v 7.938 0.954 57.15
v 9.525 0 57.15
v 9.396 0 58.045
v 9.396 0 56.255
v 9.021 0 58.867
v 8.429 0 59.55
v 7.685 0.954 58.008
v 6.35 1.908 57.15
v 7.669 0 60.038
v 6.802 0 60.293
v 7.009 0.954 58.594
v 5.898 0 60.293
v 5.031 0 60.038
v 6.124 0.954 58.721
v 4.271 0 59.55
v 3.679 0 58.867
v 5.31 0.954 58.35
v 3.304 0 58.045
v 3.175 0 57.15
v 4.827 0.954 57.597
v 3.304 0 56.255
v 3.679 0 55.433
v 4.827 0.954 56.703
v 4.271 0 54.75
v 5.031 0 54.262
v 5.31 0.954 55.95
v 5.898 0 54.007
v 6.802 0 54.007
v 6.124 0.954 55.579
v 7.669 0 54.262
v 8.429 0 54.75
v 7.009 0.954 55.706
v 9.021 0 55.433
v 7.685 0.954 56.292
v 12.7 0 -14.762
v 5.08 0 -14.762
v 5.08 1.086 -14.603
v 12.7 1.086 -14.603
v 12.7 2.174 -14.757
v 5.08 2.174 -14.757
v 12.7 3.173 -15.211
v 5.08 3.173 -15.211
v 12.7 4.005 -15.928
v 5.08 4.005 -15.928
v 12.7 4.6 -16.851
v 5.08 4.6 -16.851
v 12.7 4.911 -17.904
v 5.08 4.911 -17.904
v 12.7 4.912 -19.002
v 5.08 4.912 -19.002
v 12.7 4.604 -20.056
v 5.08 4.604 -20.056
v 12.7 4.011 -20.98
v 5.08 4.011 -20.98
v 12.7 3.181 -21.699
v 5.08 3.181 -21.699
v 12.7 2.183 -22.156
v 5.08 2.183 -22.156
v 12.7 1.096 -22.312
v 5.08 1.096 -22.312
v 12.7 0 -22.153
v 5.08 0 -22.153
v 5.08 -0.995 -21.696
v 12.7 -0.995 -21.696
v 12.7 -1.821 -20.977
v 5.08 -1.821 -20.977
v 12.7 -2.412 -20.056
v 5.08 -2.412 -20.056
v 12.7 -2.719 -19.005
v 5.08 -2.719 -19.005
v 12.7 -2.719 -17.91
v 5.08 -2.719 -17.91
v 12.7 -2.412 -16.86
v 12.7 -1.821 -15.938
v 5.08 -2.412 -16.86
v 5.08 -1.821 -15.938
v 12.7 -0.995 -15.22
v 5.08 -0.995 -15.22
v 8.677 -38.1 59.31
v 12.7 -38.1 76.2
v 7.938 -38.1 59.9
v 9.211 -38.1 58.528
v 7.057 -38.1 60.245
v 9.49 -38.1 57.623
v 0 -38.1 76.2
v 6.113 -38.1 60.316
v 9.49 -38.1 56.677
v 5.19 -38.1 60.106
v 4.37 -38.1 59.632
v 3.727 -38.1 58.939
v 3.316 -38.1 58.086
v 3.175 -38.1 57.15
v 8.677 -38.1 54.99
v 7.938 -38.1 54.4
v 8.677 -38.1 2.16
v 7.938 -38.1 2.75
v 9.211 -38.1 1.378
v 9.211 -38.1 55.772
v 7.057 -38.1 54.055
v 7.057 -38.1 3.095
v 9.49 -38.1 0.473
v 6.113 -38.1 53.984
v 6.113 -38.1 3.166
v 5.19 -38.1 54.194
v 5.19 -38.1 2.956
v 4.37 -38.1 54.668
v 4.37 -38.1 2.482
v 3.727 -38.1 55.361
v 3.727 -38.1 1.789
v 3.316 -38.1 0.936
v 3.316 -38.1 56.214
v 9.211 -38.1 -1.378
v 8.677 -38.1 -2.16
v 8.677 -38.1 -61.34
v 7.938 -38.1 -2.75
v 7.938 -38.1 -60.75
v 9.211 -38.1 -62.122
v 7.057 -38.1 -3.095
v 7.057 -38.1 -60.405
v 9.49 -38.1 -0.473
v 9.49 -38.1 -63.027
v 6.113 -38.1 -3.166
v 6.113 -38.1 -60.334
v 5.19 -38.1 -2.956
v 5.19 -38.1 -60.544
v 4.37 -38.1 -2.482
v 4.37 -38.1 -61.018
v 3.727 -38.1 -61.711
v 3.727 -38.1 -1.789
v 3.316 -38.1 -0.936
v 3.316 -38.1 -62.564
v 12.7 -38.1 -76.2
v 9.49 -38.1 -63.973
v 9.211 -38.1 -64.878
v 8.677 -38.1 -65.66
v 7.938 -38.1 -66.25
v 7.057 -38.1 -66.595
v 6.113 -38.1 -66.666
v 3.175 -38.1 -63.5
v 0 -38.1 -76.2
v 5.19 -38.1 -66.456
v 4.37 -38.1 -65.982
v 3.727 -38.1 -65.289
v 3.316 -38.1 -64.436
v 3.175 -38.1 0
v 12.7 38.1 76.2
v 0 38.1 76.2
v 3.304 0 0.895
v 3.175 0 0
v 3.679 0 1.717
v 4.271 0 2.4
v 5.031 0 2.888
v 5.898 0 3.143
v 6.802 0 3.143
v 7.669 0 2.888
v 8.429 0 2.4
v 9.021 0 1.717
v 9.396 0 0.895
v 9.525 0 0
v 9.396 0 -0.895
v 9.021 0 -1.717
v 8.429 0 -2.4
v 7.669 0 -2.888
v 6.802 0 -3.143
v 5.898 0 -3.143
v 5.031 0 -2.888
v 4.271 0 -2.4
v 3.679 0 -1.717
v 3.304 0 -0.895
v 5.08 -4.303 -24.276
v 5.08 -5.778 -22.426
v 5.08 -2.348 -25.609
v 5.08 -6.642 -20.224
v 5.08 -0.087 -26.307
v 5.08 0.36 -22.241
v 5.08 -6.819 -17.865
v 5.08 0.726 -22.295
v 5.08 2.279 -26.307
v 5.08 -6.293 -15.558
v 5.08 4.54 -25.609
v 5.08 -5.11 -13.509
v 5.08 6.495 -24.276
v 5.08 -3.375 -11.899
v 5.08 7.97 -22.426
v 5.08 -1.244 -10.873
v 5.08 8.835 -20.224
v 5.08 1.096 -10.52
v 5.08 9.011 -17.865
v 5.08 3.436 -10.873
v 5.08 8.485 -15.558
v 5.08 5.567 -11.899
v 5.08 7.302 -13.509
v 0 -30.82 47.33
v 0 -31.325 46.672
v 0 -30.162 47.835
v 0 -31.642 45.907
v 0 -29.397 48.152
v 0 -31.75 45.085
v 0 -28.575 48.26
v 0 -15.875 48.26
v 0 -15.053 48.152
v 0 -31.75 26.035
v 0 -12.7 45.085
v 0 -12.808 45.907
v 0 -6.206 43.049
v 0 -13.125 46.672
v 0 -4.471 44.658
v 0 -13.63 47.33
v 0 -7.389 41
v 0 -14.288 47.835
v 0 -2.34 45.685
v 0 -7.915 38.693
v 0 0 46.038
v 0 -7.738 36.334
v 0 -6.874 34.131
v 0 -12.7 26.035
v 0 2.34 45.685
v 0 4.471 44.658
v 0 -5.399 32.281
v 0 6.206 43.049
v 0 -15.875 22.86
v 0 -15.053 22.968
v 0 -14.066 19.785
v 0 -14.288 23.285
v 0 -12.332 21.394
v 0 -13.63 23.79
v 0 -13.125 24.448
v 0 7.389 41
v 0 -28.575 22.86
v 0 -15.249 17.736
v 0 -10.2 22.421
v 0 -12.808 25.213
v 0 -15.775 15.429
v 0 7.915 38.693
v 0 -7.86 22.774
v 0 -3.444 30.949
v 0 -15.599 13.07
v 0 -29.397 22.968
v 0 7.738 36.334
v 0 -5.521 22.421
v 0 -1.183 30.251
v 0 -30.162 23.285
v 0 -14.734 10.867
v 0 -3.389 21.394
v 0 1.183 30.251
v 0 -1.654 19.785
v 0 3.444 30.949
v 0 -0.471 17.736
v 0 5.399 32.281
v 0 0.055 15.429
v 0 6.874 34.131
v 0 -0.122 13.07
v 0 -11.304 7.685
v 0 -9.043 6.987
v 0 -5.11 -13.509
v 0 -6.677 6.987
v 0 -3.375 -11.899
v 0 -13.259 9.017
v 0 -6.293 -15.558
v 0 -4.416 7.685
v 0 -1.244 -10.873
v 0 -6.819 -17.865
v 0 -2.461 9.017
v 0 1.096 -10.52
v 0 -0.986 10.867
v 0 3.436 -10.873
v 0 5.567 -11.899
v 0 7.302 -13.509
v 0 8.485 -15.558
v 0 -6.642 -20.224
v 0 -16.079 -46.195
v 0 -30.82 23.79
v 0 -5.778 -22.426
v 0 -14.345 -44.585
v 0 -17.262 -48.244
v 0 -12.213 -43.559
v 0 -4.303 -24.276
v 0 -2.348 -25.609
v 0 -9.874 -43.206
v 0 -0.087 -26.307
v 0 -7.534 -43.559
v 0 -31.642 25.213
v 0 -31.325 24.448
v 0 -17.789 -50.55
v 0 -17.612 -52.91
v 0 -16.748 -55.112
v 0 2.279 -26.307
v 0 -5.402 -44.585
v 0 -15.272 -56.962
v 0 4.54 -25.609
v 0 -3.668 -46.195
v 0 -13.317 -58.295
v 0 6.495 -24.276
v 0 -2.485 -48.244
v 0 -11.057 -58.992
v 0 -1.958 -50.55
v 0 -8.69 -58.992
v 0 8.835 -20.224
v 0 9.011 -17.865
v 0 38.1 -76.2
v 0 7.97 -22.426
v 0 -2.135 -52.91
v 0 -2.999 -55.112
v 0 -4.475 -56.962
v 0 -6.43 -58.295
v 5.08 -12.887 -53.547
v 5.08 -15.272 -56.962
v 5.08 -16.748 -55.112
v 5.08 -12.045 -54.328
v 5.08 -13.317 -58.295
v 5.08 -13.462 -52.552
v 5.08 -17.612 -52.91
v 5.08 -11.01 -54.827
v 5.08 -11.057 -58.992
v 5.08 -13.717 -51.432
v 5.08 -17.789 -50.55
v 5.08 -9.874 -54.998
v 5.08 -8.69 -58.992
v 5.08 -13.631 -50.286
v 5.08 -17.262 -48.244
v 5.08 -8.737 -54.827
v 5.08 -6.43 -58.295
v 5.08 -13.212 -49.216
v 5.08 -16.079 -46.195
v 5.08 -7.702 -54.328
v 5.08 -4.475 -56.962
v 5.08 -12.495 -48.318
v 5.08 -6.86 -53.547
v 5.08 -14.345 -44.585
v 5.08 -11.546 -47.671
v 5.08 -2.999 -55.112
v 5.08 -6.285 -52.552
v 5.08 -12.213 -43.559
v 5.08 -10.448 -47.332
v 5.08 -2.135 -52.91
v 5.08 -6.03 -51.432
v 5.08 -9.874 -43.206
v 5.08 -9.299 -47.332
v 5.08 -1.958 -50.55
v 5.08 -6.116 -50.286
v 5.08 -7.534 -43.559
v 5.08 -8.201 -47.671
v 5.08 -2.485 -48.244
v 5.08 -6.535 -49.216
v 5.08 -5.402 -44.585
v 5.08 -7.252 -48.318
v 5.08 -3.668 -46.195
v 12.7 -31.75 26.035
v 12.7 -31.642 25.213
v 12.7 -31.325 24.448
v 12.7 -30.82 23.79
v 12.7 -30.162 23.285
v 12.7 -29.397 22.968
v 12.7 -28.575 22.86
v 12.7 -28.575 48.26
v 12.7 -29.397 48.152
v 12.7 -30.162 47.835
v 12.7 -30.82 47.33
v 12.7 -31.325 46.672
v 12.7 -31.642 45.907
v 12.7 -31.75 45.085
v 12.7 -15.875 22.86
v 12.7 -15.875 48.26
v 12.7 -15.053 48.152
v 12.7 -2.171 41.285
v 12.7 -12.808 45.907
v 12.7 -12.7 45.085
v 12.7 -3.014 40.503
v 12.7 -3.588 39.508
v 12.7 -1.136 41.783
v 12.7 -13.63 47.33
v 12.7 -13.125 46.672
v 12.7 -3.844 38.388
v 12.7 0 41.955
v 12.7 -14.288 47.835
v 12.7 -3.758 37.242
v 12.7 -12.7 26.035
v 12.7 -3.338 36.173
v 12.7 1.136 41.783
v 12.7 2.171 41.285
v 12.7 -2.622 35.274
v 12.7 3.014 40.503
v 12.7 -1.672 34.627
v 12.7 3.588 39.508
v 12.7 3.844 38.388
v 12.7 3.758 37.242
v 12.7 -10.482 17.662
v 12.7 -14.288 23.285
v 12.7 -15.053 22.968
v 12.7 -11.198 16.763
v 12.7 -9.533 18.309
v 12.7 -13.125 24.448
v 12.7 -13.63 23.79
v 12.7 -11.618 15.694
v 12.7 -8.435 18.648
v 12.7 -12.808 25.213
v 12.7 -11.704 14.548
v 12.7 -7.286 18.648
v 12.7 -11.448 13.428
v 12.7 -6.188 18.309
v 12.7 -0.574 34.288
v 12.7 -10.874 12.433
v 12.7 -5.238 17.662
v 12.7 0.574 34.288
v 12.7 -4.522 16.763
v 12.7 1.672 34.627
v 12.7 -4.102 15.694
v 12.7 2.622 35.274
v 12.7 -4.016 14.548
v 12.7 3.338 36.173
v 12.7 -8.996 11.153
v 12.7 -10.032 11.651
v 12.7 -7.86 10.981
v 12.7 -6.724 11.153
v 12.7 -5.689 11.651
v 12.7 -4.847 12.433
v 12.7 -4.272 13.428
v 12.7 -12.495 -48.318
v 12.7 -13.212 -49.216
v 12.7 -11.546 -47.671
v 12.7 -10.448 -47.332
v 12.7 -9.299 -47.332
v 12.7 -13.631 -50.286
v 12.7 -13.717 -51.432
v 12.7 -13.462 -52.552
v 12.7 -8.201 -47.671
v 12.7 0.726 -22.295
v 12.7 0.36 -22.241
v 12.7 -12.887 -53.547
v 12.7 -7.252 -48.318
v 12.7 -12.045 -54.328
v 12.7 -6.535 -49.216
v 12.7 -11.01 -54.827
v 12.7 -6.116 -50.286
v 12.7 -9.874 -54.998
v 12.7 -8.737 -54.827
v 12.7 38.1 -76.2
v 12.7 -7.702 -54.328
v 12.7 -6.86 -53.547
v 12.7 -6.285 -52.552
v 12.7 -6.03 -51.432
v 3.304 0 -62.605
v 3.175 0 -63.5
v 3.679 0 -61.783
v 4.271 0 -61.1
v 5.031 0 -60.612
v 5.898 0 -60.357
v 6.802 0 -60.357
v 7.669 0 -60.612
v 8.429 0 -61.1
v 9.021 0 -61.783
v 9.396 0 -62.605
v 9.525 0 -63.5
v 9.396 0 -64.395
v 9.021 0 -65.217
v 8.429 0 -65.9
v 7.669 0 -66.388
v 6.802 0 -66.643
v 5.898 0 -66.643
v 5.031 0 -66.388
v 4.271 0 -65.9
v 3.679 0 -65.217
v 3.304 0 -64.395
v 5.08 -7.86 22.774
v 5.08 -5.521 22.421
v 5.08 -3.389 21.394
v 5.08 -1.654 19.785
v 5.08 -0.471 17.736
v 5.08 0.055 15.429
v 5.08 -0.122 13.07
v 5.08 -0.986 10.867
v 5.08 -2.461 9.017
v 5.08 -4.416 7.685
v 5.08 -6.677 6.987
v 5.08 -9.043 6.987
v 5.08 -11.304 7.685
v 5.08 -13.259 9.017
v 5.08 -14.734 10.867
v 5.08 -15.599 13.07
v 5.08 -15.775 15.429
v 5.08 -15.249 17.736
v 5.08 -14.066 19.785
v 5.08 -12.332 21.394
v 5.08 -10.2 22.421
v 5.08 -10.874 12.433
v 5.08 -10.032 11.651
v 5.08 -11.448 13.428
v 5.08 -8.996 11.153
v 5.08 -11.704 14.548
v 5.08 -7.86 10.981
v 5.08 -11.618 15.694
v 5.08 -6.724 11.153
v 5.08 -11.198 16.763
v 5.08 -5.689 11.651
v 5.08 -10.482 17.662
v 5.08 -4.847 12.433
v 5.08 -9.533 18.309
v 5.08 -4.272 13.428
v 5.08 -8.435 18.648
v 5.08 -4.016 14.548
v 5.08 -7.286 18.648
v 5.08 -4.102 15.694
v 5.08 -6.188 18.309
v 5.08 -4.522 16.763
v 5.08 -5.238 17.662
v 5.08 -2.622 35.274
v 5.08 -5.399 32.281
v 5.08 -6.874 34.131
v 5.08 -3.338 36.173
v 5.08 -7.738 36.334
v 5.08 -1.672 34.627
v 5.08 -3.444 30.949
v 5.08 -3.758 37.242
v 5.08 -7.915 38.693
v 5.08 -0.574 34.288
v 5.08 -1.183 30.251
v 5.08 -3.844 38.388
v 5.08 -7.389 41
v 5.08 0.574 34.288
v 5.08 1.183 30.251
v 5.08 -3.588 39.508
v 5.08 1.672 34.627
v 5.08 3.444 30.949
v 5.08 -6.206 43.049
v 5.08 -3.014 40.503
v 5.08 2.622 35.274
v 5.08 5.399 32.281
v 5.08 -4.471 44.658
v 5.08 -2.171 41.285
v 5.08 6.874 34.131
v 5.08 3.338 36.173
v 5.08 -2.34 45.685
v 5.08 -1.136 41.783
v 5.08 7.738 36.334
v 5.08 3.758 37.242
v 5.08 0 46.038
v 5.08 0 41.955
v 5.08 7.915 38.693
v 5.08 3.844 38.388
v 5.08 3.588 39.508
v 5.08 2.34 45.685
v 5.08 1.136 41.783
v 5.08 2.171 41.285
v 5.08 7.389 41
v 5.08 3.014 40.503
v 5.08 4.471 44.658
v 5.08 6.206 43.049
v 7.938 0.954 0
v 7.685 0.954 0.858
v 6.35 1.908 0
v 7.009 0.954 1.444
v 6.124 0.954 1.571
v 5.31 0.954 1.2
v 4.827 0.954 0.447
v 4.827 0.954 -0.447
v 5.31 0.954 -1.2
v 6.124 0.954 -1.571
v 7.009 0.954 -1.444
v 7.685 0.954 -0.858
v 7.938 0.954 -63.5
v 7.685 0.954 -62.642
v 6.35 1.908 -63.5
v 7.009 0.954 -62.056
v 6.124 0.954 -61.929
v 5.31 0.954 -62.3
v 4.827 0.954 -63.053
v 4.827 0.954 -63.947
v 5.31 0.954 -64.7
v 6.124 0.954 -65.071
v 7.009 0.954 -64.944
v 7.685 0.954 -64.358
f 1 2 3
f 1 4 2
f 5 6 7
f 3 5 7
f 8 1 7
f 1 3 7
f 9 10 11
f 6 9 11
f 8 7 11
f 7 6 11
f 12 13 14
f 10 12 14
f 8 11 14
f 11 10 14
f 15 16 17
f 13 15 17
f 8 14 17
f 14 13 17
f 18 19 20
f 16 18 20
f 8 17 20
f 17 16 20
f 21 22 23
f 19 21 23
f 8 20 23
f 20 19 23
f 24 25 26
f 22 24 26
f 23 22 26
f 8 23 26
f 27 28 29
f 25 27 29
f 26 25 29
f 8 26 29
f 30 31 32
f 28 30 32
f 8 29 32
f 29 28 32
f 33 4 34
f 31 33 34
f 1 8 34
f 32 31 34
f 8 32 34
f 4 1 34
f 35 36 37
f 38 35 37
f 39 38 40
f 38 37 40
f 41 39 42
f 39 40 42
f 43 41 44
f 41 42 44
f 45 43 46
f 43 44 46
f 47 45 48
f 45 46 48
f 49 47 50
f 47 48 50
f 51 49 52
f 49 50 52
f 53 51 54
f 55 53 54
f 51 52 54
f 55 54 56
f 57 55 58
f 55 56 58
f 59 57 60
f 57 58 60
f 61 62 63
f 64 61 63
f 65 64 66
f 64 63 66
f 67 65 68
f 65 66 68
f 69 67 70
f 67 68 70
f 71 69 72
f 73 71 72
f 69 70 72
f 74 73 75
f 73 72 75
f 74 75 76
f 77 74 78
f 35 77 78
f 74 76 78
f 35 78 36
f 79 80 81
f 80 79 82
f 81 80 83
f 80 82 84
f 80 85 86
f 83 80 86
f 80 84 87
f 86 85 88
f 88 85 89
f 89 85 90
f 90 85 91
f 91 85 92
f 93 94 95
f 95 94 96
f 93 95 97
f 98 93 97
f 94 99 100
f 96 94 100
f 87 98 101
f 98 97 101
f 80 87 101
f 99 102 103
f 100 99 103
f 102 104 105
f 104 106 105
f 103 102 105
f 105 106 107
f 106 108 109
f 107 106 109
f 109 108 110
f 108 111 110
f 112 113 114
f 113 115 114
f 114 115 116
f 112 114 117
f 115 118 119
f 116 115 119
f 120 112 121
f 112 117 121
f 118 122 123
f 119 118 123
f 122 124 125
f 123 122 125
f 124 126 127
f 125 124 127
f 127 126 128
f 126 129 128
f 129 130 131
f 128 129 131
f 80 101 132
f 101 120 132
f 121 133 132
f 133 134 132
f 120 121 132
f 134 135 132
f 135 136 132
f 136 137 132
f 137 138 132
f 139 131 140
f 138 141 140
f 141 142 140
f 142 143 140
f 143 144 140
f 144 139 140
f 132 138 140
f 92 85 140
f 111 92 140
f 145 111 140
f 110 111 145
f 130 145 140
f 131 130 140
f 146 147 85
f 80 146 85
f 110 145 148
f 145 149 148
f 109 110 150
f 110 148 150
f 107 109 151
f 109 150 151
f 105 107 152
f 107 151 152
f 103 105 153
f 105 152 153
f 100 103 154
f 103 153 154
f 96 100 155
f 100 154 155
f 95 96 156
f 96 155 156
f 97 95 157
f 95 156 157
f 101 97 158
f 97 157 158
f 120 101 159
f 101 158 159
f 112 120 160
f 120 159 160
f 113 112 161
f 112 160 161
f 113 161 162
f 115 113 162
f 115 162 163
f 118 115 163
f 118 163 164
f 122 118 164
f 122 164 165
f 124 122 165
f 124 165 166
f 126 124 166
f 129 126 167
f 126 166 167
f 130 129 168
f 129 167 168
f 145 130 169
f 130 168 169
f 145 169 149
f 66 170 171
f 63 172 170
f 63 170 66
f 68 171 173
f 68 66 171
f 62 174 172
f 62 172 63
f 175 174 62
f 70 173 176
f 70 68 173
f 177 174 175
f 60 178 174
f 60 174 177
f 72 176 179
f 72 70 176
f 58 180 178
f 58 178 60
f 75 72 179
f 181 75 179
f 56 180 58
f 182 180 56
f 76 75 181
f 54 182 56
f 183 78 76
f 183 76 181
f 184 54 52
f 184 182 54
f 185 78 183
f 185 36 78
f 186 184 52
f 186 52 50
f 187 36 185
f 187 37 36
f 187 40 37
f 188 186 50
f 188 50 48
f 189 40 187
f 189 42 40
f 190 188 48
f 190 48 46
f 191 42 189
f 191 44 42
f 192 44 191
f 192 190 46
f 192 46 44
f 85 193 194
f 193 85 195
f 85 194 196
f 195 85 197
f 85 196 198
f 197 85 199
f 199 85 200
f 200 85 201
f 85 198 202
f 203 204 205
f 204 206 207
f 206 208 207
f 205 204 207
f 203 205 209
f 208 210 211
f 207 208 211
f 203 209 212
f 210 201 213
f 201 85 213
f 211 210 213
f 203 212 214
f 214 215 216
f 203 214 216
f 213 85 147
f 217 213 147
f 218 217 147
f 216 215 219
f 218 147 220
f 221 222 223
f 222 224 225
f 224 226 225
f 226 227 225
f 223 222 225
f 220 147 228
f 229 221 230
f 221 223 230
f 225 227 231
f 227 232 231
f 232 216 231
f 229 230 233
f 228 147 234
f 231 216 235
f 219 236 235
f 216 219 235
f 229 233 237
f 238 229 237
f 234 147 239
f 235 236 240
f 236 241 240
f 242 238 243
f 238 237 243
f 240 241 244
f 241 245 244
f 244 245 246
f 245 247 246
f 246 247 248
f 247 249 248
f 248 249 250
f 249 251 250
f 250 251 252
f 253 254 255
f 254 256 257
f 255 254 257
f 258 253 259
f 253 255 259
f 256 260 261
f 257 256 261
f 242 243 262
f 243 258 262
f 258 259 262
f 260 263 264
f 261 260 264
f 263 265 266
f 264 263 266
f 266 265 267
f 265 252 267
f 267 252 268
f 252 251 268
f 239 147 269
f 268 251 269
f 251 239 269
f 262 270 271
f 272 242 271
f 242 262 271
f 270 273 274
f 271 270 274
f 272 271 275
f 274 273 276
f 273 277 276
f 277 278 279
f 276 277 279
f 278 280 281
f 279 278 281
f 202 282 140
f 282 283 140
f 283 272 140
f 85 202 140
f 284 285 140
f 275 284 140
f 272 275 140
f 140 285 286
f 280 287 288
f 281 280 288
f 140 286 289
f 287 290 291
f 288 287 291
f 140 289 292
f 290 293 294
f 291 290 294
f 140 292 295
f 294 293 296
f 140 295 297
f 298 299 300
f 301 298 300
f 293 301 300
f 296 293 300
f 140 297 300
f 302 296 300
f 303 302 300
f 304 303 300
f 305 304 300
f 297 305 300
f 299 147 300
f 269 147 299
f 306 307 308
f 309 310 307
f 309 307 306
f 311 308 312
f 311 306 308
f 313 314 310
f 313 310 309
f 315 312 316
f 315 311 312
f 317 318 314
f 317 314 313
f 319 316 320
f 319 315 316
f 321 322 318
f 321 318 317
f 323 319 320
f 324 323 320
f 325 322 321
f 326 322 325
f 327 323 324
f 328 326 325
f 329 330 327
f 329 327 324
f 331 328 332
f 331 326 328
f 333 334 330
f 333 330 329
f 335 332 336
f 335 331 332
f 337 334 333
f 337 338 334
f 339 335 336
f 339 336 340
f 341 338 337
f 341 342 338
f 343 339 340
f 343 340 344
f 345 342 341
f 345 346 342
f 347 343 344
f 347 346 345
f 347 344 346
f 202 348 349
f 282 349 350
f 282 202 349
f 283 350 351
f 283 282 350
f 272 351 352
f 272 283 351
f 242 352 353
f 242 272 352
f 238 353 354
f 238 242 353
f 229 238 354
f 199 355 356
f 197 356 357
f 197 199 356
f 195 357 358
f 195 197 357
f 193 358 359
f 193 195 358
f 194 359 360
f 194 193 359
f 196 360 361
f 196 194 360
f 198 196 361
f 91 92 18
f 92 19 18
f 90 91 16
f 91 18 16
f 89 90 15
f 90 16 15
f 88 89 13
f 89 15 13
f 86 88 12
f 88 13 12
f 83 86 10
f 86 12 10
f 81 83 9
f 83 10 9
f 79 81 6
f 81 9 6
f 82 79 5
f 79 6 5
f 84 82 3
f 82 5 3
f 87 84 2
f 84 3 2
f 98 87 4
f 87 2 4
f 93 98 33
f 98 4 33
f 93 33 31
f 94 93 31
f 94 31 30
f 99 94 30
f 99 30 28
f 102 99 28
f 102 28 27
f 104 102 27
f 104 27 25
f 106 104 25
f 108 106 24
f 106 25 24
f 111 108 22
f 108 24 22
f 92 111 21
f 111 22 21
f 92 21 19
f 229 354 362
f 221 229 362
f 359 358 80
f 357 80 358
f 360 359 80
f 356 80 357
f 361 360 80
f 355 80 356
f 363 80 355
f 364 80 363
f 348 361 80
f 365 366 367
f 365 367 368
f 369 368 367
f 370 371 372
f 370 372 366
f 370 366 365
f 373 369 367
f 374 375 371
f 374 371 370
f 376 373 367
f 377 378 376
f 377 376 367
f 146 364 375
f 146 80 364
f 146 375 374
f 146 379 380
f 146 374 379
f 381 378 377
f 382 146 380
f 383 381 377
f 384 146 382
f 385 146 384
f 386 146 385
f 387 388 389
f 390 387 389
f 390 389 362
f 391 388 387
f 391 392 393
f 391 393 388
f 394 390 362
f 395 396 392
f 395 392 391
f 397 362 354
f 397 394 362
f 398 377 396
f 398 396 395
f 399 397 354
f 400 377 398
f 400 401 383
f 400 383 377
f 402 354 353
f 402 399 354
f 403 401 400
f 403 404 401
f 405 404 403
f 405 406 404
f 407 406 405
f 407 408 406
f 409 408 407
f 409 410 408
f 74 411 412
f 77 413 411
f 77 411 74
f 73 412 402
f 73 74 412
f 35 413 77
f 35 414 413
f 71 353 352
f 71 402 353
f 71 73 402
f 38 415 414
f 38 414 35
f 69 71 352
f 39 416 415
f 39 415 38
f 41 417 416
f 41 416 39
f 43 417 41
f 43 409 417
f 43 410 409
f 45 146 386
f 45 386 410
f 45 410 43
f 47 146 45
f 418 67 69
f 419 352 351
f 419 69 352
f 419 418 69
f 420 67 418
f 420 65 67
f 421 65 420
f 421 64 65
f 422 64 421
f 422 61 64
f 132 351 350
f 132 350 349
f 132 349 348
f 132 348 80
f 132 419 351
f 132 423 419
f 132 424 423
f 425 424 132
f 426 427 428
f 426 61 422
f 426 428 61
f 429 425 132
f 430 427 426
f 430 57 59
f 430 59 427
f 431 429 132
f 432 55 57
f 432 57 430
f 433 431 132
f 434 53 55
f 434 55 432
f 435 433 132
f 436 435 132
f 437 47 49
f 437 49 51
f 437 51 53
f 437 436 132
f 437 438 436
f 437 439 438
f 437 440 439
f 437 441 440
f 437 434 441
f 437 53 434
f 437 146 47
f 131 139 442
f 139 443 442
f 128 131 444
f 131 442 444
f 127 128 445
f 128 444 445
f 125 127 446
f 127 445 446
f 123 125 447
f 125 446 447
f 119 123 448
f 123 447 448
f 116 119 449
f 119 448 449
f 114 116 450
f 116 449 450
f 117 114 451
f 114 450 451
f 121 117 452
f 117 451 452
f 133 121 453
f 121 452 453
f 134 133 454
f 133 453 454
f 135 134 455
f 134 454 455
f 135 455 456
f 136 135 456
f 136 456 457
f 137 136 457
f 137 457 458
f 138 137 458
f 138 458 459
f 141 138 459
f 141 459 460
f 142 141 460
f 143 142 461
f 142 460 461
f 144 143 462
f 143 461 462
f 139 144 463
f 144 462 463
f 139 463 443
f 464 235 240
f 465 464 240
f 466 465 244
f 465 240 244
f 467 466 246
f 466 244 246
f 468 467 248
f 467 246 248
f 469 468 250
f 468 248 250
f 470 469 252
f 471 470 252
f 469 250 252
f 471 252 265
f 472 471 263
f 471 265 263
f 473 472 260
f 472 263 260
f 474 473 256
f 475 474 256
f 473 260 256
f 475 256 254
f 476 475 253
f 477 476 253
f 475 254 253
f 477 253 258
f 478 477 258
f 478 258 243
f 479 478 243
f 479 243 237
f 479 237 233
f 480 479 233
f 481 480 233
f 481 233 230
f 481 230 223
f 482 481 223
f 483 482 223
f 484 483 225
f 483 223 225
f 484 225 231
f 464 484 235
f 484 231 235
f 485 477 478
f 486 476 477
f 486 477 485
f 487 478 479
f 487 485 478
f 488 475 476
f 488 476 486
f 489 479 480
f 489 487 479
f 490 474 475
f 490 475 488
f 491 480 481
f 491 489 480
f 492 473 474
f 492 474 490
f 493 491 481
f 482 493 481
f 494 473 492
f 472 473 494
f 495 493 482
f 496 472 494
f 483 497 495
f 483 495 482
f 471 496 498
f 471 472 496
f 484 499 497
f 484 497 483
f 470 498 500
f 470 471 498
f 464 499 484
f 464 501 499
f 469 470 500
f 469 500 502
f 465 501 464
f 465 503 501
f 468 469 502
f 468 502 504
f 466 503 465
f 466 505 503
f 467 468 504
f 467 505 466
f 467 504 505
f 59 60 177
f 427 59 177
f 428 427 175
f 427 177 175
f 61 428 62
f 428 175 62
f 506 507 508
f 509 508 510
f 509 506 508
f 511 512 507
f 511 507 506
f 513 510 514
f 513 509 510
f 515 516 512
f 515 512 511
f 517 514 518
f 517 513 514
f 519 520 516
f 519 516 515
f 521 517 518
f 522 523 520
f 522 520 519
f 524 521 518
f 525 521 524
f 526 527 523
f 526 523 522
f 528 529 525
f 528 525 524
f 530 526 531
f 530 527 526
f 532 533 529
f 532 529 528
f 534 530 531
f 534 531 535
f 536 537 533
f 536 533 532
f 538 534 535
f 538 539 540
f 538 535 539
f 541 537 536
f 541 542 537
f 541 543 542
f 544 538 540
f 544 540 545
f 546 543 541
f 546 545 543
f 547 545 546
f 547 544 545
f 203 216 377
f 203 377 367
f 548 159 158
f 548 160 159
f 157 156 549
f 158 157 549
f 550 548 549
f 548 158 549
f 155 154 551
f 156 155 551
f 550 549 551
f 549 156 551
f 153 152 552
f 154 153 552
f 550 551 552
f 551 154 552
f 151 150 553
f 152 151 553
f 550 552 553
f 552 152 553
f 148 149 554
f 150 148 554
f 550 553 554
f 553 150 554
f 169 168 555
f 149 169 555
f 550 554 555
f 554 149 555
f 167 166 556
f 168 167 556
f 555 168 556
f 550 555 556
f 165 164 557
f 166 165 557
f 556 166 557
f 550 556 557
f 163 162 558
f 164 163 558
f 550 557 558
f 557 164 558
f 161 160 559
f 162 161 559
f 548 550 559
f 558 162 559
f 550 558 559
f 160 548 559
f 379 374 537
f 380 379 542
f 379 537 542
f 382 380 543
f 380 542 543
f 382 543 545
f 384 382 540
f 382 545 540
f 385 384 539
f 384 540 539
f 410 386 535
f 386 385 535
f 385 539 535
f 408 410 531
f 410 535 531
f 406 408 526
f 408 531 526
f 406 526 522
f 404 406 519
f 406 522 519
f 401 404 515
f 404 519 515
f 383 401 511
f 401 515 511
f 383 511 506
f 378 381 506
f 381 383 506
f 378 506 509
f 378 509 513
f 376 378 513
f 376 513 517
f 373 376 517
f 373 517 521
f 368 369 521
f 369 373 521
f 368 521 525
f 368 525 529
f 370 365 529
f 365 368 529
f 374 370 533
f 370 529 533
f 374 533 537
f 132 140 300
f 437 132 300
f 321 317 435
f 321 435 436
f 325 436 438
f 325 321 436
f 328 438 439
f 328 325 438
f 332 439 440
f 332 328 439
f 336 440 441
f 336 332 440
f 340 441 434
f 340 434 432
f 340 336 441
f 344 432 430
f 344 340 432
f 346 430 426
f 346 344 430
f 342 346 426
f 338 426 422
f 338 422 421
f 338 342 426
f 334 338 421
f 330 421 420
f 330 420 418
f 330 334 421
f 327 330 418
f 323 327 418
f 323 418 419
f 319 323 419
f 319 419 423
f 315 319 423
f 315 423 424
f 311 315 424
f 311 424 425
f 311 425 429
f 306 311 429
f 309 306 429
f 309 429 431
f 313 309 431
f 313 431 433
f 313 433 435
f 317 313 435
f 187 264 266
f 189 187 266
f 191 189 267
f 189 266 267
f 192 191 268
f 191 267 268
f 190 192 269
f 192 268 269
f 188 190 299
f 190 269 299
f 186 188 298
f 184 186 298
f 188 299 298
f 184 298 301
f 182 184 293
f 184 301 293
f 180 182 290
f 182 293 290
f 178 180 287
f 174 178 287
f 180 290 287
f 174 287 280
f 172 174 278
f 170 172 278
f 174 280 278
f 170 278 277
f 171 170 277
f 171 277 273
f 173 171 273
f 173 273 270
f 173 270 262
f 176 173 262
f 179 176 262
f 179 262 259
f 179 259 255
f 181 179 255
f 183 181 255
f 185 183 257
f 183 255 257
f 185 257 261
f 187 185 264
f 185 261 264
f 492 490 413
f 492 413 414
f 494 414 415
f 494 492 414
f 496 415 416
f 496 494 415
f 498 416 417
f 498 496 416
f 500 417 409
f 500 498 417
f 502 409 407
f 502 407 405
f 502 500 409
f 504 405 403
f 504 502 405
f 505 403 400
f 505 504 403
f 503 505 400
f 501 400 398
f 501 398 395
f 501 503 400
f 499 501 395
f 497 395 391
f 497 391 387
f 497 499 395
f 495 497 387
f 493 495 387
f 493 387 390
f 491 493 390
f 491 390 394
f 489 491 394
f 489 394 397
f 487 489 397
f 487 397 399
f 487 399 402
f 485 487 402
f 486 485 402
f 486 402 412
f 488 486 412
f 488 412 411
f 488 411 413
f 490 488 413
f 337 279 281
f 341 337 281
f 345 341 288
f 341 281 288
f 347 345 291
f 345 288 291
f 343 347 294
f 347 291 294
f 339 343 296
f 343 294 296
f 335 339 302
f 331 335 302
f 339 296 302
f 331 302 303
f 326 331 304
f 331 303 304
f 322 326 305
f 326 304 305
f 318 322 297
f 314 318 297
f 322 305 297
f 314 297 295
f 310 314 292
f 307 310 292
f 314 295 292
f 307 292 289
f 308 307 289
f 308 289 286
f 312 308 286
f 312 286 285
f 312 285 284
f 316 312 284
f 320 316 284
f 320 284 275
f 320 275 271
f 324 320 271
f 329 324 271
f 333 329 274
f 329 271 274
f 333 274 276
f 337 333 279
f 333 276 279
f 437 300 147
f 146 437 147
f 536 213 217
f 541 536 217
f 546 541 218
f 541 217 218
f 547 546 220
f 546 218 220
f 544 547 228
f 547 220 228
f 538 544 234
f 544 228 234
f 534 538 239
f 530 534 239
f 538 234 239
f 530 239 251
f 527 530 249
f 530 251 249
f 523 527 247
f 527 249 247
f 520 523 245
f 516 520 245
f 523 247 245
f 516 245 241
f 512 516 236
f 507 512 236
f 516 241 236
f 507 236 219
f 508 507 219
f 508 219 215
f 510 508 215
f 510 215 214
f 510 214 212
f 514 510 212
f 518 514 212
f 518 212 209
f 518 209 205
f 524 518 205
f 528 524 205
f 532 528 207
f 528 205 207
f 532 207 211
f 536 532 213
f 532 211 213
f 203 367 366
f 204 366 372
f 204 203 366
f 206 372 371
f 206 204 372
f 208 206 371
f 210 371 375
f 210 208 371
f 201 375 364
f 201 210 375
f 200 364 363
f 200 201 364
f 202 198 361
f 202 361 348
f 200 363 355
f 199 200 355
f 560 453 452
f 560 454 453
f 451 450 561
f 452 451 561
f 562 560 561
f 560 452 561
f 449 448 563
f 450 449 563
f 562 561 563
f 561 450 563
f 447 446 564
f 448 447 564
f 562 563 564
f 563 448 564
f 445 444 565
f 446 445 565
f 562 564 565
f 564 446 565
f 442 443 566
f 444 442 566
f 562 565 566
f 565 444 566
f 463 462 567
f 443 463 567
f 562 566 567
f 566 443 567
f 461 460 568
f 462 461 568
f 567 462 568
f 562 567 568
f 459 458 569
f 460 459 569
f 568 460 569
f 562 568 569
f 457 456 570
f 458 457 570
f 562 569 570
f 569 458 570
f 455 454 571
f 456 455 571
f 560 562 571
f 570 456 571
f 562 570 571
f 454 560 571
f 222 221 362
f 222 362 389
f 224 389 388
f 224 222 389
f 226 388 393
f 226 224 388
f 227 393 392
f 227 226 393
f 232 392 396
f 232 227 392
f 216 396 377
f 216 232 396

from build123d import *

# Parameters (mm, degrees)
SKETCH1_W                       = 152.4
SKETCH1_H                       = 76.2
SKETCH1_R                       = 3.854557775
BOSS_EXTRUDE1_DEPTH             = 12.7
F_1_4_0_25_DIAMETER_HOLE2_D     = 6.35
F_1_4_0_25_DIAMETER_HOLE2_DEPTH = 38.1
F_1_4_0_25_DIAMETER_HOLE2_TIP   = 1.907732465
SKETCH2_R                       = 7.9375
CUT_EXTRUDE1_DEPTH              = 5.08
CUT_EXTRUDE2_DEPTH              = 87.135590786


with BuildPart() as part:
    # Sketch1 → Boss-Extrude1 (new body)
    with BuildSketch(Plane(origin=(0, 0, 0), x_dir=(0, 0, -1), z_dir=(1, 0, 0))):
        Rectangle(SKETCH1_W, SKETCH1_H)
        with Locations((18.457733582, 1.096077429)):
            Circle(SKETCH1_R, mode=Mode.SUBTRACT)
        with Locations((-38.1, 0)):
            Circle(SKETCH1_R, mode=Mode.SUBTRACT)
        with Locations((-14.836022013, -7.860160654)):
            Circle(SKETCH1_R, mode=Mode.SUBTRACT)
        with Locations((51.143457994, -9.873506971)):
            Circle(SKETCH1_R, mode=Mode.SUBTRACT)
    extrude(amount=BOSS_EXTRUDE1_DEPTH)

    # 1/4 (0.25) Diameter Hole2
    with Locations(Plane.XZ.offset(38.1)):
        with Locations((6.35, 57.15), (6.35, -63.5), (6.35, 0)):
            Hole(F_1_4_0_25_DIAMETER_HOLE2_D / 2, depth=F_1_4_0_25_DIAMETER_HOLE2_DEPTH)
            with Locations((0, 0, -(F_1_4_0_25_DIAMETER_HOLE2_DEPTH + F_1_4_0_25_DIAMETER_HOLE2_TIP / 2))):  # 118° drill point
                Cone(0, F_1_4_0_25_DIAMETER_HOLE2_D / 2, F_1_4_0_25_DIAMETER_HOLE2_TIP, mode=Mode.SUBTRACT)

    # Sketch2 → Cut-Extrude1 (cut)
    with BuildSketch(Plane.ZY):
        with Locations((38.1, 0)):
            Circle(SKETCH2_R)
        with Locations((14.836022013, -7.860160654)):
            Circle(SKETCH2_R)
        with Locations((-18.457733582, 1.096077429)):
            Circle(SKETCH2_R)
        with Locations((-51.143457994, -9.873506971)):
            Circle(SKETCH2_R)
    extrude(amount=-CUT_EXTRUDE1_DEPTH, mode=Mode.SUBTRACT)

    # Sketch5 → Cut-Extrude2 (cut, through all)
    with BuildSketch(Plane.ZY):
        with BuildLine():
            Line((26.035, -12.7), (45.085, -12.7))
            ThreePointArc((45.085, -12.7), (47.33006403, -13.62993597), (48.26, -15.875))
            Line((48.26, -15.875), (48.26, -28.575))
            ThreePointArc((48.26, -28.575), (47.33006403, -30.82006403), (45.085, -31.75))
            Line((45.085, -31.75), (26.035, -31.75))
            ThreePointArc((26.035, -31.75), (23.78993597, -30.82006403), (22.86, -28.575))
            Line((22.86, -28.575), (22.86, -15.875))
            ThreePointArc((22.86, -15.875), (23.78993597, -13.62993597), (26.035, -12.7))
        make_face()
    extrude(amount=-CUT_EXTRUDE2_DEPTH, mode=Mode.SUBTRACT)


solid = part.part
